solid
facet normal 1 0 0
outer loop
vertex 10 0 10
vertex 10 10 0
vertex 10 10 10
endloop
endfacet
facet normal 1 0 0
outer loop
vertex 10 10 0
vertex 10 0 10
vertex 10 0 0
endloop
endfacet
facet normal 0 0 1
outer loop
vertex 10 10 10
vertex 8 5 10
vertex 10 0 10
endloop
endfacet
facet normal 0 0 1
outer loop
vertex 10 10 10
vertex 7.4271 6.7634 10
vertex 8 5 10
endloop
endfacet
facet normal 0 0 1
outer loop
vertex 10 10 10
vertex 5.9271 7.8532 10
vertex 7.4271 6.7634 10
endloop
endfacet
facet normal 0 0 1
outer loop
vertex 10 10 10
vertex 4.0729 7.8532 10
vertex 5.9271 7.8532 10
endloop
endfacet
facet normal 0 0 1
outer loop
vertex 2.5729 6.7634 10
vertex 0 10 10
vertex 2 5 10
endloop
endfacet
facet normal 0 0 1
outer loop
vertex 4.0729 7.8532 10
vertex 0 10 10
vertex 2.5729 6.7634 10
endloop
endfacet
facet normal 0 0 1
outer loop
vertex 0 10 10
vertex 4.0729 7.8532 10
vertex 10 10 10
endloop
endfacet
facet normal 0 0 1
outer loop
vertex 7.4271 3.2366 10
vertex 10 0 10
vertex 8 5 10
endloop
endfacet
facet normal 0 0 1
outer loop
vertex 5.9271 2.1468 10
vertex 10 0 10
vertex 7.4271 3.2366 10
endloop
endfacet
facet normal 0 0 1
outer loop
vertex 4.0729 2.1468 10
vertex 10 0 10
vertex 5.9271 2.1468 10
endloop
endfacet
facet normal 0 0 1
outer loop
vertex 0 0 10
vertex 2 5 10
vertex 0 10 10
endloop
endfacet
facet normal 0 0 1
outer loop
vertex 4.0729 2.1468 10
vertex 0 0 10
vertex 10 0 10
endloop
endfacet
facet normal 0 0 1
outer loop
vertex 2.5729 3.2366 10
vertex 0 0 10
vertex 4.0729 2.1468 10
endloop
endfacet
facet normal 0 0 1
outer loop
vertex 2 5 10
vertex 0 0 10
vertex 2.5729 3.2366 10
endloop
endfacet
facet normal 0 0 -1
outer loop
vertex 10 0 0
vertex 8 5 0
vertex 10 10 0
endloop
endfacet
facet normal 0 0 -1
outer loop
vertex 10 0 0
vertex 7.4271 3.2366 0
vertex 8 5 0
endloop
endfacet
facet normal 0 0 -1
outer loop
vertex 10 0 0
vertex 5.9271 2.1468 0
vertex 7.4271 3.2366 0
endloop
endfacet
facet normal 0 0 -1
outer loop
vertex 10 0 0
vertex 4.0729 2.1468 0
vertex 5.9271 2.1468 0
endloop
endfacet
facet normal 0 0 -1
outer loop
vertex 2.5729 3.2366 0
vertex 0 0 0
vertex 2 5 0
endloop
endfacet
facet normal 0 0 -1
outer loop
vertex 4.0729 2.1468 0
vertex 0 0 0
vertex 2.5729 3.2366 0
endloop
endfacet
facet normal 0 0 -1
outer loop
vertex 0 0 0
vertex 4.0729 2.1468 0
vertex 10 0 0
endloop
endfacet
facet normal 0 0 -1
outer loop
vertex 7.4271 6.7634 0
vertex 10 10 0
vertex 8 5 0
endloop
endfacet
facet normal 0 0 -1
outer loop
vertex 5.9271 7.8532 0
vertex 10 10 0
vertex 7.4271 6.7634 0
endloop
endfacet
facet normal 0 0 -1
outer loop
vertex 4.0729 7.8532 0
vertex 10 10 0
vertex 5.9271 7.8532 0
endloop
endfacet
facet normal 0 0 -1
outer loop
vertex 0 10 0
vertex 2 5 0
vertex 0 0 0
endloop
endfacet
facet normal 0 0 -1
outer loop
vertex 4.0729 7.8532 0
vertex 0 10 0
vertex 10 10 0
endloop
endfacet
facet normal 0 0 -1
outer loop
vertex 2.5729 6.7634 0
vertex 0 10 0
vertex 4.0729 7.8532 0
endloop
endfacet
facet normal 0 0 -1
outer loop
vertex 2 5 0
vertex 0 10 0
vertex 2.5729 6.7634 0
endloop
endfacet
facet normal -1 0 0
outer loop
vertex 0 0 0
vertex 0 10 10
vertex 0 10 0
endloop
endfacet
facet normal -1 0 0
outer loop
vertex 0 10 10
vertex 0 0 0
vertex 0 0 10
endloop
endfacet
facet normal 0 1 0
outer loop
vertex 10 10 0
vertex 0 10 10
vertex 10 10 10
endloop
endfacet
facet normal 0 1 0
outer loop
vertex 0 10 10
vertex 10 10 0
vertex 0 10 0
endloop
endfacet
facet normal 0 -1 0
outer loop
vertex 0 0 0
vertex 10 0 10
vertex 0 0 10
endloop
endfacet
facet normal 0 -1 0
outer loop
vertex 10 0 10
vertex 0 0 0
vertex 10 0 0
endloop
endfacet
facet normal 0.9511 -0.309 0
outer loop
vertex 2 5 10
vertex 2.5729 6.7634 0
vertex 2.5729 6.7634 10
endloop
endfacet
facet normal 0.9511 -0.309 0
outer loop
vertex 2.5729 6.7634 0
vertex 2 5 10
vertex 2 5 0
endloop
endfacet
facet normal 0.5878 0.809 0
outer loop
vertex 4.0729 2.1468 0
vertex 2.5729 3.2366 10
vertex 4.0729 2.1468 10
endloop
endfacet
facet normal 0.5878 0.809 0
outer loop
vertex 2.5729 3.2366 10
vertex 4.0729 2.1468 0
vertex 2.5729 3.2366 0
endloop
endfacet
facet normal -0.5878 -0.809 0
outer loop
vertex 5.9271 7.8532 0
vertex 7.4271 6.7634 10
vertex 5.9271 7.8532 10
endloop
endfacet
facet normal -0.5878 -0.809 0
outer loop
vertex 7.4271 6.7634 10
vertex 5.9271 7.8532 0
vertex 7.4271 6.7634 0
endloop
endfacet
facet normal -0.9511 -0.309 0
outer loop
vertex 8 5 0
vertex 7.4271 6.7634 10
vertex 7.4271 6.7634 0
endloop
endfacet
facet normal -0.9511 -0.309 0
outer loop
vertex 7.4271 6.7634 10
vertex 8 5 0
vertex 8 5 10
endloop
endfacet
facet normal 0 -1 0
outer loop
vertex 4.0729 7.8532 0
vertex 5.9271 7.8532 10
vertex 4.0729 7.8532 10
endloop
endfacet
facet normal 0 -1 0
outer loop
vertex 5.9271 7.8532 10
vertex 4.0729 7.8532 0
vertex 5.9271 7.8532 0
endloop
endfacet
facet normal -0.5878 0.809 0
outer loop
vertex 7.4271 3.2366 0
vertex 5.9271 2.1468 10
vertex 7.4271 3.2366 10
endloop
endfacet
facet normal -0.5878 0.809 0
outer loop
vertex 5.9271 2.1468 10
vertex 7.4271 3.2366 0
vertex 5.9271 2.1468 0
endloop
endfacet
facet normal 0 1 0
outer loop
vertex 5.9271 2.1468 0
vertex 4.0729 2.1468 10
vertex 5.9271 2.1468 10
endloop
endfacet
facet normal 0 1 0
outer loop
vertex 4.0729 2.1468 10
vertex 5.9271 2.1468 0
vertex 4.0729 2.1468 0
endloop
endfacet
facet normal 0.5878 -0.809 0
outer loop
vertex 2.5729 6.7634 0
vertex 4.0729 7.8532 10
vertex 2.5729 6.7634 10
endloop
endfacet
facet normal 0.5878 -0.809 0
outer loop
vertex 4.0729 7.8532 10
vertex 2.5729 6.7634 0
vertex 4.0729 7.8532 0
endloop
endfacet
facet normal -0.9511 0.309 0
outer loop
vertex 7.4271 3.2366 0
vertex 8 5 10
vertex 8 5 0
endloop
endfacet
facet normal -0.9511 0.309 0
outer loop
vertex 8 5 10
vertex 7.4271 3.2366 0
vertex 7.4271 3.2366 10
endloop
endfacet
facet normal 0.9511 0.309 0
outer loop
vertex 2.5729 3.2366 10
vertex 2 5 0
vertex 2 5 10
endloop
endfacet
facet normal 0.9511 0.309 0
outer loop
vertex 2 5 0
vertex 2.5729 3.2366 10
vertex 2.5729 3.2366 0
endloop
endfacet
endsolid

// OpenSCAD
difference() { cube(10); color("blue") translate([5,5,-1]) cylinder(h=12, r=3); }
